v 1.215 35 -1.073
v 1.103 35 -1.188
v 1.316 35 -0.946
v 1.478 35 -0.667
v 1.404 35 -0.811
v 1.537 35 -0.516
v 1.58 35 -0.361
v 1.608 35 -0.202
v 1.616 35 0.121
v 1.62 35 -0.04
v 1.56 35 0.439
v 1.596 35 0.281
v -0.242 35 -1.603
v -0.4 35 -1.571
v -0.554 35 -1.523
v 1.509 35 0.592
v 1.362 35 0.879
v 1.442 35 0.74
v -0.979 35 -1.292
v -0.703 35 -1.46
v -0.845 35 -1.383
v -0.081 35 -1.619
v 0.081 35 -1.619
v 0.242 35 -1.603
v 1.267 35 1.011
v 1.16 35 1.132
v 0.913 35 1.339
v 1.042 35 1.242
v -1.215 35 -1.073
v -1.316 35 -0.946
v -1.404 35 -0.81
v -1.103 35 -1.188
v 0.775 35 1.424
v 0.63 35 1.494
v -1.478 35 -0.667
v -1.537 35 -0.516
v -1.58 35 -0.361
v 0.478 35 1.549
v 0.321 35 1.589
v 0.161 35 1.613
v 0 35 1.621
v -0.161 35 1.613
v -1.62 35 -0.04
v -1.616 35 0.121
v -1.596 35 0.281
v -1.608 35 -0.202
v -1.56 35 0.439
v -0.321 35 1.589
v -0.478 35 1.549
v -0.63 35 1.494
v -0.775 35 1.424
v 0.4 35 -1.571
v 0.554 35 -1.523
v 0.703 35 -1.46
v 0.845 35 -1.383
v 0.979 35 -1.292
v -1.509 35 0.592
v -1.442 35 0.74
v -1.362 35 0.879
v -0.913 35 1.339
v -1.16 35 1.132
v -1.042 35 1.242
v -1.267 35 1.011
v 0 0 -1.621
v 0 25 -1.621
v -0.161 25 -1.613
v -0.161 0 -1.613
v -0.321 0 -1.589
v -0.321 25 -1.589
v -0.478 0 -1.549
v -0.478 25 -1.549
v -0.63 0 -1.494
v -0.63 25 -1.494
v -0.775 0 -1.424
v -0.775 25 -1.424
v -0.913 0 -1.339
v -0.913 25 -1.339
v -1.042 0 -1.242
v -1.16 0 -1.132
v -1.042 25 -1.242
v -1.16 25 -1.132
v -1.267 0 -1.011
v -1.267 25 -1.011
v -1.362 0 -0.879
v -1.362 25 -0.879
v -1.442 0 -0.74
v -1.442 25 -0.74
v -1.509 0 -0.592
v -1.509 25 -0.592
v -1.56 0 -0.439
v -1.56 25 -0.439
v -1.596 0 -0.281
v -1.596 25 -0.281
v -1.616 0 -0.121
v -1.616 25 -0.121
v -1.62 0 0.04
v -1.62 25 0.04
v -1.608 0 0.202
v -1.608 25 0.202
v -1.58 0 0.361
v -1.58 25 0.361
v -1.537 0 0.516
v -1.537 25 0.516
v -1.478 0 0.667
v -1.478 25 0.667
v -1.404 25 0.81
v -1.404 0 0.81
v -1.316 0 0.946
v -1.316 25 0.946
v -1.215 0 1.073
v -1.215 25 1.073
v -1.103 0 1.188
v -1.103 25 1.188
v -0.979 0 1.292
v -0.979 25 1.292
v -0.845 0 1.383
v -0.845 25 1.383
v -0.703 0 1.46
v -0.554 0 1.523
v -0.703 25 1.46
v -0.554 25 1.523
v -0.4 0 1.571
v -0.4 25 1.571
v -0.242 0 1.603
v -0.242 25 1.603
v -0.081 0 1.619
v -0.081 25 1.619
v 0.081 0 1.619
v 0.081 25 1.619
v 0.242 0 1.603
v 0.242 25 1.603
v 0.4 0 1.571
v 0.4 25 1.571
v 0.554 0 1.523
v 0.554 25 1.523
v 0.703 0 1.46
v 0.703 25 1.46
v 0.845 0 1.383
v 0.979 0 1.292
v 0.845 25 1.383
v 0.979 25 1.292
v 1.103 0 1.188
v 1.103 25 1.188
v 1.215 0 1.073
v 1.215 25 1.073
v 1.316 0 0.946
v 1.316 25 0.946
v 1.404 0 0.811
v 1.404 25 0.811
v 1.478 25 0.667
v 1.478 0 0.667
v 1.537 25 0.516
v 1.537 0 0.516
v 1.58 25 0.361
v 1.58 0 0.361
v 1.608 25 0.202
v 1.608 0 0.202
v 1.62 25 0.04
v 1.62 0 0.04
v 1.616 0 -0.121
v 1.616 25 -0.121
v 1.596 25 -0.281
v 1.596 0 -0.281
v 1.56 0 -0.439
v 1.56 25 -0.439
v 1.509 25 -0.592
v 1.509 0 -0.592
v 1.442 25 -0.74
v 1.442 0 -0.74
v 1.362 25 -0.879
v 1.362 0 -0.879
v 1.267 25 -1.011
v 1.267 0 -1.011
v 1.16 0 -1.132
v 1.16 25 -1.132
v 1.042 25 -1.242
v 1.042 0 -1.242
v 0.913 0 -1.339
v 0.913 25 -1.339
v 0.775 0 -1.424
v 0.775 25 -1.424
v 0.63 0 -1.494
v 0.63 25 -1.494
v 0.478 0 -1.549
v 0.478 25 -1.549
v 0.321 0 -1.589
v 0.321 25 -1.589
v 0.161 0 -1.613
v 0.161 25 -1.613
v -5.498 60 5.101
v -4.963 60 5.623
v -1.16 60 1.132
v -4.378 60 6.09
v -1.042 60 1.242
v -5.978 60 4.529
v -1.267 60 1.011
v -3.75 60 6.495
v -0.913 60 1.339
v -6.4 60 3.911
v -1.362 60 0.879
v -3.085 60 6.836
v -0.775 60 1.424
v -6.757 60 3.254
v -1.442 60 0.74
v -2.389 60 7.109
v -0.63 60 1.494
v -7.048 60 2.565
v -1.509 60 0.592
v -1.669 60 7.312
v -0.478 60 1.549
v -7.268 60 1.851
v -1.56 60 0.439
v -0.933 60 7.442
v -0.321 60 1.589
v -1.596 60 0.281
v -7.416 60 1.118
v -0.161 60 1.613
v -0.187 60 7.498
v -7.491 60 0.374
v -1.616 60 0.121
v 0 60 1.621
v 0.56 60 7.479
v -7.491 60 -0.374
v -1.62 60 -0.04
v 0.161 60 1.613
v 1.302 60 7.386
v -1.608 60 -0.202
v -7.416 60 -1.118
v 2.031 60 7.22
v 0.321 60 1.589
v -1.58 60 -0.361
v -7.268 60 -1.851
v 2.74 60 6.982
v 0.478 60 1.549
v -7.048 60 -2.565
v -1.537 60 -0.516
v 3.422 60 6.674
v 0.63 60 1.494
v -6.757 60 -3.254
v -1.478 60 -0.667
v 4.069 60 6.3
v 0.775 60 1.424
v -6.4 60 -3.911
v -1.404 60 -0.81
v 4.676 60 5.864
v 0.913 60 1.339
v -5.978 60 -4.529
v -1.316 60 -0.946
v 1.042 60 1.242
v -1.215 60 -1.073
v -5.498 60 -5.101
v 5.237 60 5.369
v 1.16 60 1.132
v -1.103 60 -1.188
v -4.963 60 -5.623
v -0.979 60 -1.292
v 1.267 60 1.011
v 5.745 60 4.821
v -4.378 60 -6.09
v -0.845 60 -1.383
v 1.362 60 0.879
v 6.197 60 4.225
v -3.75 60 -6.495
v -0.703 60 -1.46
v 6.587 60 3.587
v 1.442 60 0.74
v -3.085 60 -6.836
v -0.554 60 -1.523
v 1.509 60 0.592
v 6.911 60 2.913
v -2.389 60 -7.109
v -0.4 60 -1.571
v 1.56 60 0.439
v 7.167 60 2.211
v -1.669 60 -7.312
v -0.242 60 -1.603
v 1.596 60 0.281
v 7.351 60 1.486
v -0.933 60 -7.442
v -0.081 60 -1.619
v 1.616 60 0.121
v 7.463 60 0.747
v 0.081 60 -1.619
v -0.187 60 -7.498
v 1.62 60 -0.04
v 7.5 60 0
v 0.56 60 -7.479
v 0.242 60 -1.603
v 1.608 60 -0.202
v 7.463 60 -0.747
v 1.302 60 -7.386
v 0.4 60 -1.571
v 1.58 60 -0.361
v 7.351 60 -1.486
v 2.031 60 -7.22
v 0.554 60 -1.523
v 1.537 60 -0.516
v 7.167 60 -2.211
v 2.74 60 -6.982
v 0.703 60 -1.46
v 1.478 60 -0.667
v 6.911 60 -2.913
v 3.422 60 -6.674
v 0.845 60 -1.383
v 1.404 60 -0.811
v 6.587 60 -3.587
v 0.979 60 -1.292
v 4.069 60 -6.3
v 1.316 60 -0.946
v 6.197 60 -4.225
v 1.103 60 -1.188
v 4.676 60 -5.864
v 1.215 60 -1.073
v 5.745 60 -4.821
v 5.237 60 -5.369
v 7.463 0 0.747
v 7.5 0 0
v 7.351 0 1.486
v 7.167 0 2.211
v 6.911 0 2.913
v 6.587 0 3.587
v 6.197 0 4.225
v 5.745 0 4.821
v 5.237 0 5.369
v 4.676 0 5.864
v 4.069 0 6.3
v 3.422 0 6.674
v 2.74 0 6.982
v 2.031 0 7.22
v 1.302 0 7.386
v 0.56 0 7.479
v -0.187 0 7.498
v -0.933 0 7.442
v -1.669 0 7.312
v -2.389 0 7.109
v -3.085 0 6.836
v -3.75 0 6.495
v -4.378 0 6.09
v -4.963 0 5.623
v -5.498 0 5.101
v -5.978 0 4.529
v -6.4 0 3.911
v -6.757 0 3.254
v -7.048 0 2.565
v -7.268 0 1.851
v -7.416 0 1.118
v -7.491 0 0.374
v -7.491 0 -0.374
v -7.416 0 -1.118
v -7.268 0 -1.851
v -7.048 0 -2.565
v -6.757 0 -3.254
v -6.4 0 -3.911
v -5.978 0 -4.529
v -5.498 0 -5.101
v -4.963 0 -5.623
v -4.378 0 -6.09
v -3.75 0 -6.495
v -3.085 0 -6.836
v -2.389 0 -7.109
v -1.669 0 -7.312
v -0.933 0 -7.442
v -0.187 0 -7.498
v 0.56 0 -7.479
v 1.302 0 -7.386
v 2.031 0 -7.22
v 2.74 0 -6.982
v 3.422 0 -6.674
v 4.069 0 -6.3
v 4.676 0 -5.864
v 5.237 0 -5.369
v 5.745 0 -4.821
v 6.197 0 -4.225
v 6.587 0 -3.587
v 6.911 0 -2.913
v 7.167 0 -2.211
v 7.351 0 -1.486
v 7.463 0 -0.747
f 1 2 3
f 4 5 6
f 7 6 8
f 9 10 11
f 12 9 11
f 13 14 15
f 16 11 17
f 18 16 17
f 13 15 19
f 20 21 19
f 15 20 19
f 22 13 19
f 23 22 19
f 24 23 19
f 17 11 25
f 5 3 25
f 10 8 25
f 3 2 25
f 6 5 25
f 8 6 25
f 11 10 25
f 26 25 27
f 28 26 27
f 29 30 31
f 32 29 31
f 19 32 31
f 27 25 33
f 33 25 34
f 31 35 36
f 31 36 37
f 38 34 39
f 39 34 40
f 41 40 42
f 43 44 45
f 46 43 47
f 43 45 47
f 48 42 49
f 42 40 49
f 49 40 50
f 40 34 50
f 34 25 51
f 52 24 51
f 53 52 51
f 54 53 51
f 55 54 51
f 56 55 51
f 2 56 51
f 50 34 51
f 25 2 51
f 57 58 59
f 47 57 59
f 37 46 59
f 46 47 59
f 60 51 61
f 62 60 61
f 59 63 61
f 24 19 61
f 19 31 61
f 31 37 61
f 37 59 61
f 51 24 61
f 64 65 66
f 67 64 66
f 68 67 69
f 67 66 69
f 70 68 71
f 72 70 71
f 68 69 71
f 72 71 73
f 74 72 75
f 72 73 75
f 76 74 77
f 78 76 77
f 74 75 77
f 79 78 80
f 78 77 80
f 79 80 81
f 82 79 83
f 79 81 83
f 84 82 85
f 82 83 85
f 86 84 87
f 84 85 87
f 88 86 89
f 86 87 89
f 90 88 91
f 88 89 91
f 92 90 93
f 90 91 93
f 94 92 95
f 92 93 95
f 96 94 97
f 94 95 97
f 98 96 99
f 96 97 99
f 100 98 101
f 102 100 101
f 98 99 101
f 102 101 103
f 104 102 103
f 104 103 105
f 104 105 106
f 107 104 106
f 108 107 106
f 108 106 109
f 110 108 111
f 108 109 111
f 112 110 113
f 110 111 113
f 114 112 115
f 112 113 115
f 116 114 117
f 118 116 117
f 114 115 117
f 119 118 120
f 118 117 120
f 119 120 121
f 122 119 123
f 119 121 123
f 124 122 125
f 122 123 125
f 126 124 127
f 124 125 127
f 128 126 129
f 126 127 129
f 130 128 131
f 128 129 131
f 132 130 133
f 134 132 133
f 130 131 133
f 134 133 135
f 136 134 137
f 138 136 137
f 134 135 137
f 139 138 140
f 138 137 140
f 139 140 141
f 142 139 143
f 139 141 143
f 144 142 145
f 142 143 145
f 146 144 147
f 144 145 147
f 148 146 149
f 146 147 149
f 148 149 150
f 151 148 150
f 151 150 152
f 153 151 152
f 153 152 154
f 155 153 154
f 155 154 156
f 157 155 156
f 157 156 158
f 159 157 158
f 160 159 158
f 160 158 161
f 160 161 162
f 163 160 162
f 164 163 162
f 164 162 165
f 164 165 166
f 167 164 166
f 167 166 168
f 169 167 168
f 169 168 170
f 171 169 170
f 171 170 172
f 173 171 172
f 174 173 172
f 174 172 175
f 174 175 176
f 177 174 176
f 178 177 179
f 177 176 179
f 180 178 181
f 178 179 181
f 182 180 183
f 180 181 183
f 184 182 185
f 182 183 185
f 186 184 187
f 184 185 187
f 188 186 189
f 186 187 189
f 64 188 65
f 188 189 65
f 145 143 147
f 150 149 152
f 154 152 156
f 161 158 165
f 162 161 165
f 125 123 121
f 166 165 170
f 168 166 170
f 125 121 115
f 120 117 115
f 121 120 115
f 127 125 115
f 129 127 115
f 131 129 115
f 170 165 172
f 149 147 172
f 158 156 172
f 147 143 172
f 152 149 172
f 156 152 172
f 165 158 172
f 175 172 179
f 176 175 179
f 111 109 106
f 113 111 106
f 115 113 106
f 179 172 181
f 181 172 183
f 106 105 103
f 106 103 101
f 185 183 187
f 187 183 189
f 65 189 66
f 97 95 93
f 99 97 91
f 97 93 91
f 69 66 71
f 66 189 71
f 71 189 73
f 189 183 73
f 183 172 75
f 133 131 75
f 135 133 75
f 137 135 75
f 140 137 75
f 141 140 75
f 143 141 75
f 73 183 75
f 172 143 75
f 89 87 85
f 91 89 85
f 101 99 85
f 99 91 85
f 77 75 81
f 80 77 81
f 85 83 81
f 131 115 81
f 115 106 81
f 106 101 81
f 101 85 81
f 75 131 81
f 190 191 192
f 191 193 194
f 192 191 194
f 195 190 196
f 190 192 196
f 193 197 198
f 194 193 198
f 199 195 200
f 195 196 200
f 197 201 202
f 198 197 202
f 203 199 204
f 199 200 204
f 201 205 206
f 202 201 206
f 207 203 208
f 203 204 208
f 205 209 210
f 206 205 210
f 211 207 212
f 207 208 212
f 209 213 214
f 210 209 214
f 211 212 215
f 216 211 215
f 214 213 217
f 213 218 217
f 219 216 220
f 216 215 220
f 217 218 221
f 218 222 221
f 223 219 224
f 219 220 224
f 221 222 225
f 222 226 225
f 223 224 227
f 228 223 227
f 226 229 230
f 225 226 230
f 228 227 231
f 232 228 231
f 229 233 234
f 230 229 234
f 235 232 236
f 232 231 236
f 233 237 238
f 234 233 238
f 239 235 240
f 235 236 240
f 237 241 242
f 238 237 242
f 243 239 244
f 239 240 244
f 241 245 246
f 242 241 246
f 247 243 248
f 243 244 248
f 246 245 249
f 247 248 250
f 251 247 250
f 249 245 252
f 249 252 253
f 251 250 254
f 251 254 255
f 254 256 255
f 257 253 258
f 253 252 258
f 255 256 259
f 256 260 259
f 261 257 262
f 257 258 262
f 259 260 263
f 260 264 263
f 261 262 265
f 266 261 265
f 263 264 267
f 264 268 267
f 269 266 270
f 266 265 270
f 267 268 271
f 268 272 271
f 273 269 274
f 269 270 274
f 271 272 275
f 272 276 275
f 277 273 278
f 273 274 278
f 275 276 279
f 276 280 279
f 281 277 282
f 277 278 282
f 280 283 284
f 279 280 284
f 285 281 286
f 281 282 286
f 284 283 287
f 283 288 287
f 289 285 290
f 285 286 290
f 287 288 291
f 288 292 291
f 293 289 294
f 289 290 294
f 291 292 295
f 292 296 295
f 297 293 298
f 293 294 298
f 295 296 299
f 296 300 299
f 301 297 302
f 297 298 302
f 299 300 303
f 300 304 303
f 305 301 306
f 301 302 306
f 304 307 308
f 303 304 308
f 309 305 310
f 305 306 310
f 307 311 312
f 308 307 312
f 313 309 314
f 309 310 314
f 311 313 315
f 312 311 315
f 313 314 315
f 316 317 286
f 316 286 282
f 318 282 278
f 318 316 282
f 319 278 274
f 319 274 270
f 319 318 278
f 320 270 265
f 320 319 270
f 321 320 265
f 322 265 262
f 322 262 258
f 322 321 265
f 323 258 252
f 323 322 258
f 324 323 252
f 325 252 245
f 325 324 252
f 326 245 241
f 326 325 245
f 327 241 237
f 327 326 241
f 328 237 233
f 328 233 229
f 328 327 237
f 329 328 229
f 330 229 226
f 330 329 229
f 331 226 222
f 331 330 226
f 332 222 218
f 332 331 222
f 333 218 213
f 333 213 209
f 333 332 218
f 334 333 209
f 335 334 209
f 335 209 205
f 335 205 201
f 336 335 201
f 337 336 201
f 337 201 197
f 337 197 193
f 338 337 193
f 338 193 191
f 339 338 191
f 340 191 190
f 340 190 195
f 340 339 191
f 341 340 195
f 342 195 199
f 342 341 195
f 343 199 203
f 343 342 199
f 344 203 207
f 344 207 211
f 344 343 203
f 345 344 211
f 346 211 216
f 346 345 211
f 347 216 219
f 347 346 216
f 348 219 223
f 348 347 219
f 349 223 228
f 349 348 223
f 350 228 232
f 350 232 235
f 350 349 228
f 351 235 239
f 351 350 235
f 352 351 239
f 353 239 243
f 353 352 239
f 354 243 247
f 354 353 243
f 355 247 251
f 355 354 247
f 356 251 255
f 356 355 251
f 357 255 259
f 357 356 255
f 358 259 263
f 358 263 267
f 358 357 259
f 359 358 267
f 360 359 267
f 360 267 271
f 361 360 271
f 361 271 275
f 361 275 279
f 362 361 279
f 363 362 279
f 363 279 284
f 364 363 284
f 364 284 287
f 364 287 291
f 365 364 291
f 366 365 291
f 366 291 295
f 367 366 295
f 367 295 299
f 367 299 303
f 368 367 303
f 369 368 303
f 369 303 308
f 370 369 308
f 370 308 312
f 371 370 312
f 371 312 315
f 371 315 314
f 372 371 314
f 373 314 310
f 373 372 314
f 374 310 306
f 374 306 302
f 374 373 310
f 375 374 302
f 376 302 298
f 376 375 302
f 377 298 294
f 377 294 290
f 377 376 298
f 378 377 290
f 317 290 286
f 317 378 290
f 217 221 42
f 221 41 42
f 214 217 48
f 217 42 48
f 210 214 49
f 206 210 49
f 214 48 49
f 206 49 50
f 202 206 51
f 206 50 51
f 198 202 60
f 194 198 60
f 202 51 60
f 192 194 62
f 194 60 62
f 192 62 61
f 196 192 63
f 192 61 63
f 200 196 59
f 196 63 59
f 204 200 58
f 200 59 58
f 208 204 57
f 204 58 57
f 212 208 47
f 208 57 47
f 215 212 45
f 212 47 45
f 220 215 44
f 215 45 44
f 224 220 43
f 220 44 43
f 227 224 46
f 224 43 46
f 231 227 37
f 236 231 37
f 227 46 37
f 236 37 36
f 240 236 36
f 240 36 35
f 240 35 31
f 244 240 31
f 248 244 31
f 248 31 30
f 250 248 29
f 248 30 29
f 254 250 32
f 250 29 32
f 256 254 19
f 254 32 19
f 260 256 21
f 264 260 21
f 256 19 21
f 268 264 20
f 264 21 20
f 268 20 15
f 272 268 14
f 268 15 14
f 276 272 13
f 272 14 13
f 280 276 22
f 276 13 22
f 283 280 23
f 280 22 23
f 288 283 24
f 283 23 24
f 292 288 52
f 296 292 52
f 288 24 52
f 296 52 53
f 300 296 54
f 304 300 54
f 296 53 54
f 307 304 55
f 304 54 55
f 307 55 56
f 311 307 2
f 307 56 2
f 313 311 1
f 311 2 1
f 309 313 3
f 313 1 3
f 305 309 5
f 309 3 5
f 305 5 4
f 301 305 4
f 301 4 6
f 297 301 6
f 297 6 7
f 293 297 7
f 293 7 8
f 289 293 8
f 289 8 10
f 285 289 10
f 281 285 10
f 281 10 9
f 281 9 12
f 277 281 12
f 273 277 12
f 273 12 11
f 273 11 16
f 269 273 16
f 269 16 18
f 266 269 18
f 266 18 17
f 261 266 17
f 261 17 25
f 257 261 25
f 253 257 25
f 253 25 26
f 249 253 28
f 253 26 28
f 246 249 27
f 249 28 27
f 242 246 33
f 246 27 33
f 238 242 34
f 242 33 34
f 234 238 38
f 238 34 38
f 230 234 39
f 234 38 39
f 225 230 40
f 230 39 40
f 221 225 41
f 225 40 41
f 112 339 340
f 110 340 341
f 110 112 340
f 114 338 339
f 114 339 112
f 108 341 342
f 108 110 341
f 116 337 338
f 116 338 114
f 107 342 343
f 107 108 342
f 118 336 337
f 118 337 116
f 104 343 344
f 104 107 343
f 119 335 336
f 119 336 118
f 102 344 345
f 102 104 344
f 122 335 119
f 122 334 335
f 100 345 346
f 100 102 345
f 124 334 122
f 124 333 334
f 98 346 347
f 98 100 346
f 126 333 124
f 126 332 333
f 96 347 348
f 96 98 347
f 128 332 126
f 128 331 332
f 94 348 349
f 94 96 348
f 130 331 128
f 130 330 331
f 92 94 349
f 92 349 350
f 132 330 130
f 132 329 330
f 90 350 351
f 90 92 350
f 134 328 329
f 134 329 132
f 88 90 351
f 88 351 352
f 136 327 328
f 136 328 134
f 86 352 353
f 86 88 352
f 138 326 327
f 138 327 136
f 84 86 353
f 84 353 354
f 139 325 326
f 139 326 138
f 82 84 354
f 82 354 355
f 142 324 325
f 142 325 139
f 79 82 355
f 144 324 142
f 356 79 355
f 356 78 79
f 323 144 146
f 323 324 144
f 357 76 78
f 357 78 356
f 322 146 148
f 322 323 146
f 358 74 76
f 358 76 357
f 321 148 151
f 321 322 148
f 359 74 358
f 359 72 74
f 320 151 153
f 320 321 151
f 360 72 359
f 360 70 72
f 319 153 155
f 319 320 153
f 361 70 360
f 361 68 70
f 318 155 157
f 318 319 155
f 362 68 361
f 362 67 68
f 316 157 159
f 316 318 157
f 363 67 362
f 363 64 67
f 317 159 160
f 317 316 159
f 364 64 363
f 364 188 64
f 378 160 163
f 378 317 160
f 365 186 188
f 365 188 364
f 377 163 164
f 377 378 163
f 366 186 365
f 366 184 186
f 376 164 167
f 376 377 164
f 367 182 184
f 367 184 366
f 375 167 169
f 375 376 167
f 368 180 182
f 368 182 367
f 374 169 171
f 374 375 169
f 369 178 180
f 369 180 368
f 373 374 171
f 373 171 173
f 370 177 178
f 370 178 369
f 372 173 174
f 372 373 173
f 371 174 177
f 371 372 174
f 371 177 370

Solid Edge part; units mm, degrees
sketch "Sketch1" plane through (60.3162, 0, 60.3162) normal (0, -1, 0) x (1, 0, 0)
  circle A0 centre (-60.3162, -60.3162) radius 7.5
extrude "Protrusion1" add sketch "Sketch1" against normal blind 60
hole "Bohrung_1" at (0, 0, 0) direction (0, 1, 0) diameter 3.242 depth 25 thread major 4 thread length 20
hole "Bohrung_2" at (0, 60, 0) direction (0, -1, 0) diameter 3.242 depth 25 thread major 4 thread length 20
properties material "Aluminium, 1060"
